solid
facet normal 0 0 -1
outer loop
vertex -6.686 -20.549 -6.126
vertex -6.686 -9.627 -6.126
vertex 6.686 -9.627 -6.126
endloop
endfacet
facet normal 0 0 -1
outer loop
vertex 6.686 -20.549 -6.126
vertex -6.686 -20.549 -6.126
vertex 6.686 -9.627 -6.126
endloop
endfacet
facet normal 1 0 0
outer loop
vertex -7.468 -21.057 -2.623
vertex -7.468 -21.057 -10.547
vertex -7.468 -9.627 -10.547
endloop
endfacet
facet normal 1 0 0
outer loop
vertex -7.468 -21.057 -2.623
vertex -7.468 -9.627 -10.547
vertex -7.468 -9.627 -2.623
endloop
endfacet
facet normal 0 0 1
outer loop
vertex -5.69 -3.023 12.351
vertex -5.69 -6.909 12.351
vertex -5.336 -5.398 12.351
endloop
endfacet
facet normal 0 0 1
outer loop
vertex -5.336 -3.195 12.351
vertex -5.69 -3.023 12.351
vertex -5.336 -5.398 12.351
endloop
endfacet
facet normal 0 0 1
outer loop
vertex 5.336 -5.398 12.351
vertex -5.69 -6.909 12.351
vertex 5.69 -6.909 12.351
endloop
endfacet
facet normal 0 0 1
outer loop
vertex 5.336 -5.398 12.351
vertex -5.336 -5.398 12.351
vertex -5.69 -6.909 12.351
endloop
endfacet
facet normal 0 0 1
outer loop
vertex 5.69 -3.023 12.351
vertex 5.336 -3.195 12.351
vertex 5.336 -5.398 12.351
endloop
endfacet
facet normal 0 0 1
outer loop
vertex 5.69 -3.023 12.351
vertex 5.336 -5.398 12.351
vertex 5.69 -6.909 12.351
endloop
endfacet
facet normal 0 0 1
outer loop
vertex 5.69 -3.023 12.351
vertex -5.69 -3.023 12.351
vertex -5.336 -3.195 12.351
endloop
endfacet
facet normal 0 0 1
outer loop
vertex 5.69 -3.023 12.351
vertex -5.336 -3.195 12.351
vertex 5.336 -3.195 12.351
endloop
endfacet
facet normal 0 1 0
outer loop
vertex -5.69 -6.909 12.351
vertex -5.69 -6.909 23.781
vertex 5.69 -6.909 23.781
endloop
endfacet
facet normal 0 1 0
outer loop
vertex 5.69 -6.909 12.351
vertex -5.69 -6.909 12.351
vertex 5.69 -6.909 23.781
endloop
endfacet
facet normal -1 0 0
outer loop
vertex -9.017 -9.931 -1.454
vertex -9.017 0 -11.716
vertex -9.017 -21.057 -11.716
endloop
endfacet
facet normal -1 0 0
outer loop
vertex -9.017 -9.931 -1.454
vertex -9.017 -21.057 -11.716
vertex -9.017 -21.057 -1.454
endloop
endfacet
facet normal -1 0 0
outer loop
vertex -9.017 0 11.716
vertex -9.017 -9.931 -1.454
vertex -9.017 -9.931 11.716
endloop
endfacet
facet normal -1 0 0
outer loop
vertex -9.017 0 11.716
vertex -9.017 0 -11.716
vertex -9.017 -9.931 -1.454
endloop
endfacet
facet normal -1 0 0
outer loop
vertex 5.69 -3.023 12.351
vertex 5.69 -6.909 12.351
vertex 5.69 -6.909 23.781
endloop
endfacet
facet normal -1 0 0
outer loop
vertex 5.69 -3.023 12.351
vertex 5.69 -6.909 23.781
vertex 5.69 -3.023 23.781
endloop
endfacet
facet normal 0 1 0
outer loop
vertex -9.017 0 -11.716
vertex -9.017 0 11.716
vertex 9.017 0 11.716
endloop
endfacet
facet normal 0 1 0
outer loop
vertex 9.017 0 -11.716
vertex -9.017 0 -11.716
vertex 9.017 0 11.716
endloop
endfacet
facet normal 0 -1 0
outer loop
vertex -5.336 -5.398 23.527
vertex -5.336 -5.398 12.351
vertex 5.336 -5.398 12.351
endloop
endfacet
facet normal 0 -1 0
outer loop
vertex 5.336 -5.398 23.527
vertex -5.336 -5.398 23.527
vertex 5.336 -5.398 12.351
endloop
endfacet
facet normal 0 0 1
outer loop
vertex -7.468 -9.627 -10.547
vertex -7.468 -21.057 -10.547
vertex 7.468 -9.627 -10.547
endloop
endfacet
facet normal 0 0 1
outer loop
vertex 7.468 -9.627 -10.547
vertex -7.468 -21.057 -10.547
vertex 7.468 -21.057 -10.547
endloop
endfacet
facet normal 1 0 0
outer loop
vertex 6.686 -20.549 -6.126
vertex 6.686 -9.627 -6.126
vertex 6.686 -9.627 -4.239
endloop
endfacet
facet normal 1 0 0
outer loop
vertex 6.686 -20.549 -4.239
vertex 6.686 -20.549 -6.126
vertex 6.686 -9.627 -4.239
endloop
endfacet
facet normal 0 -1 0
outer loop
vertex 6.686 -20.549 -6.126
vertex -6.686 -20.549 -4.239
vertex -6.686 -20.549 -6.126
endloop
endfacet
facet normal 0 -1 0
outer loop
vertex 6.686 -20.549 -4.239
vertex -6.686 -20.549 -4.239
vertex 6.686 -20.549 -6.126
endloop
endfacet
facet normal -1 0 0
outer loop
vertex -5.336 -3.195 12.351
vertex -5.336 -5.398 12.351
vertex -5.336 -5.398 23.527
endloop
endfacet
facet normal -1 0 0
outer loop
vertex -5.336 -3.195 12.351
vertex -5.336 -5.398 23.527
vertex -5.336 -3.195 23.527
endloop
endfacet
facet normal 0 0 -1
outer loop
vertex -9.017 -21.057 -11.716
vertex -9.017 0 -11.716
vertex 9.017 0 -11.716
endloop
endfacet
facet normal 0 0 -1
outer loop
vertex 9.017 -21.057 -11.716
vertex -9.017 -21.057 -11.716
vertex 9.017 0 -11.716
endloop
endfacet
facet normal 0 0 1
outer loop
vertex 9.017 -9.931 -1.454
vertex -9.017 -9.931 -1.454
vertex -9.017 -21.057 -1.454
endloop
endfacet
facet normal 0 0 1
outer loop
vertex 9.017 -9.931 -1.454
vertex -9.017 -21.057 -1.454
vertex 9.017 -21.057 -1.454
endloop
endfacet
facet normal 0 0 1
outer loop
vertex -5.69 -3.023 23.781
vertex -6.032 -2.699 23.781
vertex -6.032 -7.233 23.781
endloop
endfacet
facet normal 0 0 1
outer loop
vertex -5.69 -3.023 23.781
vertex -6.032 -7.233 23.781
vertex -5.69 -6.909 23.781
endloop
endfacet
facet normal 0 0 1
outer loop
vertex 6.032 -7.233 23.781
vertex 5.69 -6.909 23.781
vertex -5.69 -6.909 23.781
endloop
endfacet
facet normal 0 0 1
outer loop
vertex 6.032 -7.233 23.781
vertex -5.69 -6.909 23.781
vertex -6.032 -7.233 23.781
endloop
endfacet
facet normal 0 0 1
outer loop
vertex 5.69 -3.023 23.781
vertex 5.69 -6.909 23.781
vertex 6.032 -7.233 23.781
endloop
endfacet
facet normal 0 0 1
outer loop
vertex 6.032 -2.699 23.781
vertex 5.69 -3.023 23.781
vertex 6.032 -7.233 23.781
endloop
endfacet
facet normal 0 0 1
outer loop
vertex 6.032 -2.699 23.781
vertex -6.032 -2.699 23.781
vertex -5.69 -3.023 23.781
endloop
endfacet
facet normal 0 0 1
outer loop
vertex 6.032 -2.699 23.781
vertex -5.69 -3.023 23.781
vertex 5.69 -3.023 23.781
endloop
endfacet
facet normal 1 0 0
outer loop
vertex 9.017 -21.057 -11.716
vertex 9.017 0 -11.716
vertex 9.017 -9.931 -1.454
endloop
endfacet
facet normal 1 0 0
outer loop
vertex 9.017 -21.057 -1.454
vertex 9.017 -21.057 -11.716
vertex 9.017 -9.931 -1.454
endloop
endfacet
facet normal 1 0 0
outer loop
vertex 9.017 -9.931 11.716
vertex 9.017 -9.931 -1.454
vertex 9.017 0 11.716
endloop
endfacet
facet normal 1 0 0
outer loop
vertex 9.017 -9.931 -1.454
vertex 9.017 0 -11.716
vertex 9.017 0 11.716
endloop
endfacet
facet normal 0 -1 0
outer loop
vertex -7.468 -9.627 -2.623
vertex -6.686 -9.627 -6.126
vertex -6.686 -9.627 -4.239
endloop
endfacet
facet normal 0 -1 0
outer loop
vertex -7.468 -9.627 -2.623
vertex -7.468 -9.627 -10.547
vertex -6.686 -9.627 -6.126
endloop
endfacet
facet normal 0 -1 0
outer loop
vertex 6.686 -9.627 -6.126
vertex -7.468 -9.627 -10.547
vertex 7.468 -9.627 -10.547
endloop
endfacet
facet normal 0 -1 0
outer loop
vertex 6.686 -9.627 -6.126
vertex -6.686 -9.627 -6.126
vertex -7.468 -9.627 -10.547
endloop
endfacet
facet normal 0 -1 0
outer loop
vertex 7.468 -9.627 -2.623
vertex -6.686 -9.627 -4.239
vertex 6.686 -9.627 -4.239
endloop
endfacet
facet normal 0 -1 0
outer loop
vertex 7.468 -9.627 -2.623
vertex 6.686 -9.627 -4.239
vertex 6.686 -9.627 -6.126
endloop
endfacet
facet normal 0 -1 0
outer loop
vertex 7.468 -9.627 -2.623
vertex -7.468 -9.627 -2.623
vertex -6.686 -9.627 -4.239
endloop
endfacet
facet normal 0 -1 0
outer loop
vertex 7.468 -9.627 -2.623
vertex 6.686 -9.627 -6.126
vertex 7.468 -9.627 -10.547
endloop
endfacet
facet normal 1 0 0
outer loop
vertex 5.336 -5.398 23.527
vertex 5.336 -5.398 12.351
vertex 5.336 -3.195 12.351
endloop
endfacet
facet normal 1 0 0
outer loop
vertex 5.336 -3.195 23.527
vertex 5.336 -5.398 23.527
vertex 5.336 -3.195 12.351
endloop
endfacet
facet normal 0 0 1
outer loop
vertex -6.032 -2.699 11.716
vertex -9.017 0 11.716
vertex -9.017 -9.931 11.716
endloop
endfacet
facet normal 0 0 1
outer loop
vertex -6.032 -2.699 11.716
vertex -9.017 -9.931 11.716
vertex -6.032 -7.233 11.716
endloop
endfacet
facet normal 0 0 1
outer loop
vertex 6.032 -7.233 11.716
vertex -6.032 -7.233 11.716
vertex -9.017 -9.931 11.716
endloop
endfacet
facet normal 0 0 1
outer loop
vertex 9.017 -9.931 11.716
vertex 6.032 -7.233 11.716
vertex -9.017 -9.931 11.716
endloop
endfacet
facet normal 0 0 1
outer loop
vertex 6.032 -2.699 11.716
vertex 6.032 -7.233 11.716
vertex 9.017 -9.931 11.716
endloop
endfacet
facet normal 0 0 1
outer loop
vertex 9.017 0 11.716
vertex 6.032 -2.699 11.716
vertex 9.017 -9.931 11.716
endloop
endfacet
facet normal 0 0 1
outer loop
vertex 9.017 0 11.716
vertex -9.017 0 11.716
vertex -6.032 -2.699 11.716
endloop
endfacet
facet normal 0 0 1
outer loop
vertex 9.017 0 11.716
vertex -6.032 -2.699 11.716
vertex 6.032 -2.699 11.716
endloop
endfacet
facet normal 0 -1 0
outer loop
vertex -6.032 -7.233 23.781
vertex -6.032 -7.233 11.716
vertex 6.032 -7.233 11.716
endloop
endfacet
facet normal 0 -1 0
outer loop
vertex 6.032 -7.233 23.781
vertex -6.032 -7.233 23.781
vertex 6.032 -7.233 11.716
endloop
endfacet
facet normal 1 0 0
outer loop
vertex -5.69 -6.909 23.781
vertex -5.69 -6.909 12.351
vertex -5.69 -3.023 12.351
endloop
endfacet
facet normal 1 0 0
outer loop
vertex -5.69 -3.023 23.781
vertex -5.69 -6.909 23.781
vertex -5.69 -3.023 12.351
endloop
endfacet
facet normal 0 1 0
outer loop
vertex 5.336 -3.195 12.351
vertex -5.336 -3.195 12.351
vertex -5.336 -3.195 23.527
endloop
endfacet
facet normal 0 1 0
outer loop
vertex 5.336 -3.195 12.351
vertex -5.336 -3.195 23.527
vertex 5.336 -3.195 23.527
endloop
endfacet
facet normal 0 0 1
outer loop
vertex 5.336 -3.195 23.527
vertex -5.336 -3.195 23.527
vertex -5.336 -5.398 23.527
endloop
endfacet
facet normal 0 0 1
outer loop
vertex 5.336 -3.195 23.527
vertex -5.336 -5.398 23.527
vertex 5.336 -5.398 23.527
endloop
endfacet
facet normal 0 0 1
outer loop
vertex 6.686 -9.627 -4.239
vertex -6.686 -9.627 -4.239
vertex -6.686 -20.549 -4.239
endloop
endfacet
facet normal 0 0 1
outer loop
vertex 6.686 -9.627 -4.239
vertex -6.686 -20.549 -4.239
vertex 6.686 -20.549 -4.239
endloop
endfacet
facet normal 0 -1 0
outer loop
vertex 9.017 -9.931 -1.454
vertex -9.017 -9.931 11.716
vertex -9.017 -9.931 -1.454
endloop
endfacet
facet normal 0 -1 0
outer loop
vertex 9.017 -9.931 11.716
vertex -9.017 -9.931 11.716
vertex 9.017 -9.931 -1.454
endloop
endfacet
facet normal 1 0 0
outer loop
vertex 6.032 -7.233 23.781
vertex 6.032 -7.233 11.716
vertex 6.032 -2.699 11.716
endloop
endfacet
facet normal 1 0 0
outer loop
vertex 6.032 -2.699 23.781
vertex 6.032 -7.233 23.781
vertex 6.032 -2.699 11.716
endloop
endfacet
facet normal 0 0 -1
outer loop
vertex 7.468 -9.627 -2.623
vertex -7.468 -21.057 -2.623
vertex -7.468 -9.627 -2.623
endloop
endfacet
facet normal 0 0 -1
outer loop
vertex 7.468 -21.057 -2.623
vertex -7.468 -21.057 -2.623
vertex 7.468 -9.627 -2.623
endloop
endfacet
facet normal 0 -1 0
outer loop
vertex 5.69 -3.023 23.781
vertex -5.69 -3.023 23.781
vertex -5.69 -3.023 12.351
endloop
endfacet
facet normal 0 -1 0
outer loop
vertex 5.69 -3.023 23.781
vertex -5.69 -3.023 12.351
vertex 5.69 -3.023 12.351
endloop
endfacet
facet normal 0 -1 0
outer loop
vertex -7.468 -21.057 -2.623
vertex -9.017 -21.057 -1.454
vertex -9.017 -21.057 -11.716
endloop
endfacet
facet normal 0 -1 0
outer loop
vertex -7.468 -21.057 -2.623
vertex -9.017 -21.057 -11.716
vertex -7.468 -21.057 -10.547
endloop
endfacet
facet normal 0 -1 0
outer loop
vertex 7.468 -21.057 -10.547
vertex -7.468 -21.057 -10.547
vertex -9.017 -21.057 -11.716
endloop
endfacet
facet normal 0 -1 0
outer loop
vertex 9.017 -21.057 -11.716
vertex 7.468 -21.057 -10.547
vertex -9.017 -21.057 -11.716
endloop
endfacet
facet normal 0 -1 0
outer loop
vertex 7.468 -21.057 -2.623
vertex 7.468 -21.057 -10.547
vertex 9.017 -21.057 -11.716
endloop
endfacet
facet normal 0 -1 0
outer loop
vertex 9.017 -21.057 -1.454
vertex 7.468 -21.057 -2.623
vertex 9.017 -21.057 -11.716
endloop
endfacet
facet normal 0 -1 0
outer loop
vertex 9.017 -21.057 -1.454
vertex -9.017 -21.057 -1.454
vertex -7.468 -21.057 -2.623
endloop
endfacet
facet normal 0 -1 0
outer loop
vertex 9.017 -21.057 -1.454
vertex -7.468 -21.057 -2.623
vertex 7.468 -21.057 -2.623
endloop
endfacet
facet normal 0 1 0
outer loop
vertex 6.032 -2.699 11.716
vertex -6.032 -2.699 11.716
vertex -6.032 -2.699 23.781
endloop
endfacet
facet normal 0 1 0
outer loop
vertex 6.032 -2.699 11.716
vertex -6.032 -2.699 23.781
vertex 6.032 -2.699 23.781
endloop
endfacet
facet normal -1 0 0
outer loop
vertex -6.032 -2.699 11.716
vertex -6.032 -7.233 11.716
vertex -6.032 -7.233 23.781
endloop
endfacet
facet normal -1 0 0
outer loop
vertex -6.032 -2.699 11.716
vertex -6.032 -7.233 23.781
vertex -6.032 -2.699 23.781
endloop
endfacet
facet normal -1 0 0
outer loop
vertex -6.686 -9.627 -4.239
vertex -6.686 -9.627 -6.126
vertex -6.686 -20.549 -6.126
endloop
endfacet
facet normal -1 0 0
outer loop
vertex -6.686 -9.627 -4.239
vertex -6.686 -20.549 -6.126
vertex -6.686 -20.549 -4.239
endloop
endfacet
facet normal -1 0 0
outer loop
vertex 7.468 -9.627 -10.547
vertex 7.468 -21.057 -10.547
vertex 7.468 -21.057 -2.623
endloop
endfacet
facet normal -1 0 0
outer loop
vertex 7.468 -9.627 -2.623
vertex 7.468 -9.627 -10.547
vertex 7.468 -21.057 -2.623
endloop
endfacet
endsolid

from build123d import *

# Parameters (mm, degrees)
F0_W      = 18.034
F0_H      = 23.4315
F1_DEPTH  = 21.0566
F2_W      = 18.034
F2_H      = 11.1252
F3_DEPTH  = 13.1699
F4_W      = 12.065
F4_H      = 4.5339
F5_DEPTH  = 12.065
F6_W      = 14.9352
F6_H      = 7.9248
F7_DEPTH  = 11.43
F8_W      = 11.3792
F8_H      = 3.8862
F9_DEPTH  = 11.43
F10_W     = 10.67195
F10_H     = 2.202249
F11_DEPTH = 11.176
F12_W     = 13.372126
F12_H     = 1.887192
F13_DEPTH = 10.922


with BuildPart() as f1:
    # F0 (on Front) → F1 (new body)
    with BuildSketch(Plane.XZ):
        Rectangle(F0_W, F0_H)
    extrude(amount=F1_DEPTH)

    # F2 (on face) → F3 (cut)
    with BuildSketch(Plane.XY.offset(11.71575)):
        with Locations((0, -15.494)):
            Rectangle(F2_W, F2_H)
    extrude(amount=-F3_DEPTH, mode=Mode.SUBTRACT)

    # F4 (on face) → F5 (join)
    with BuildSketch(Plane.XY.offset(11.71575)):
        with Locations((0, -4.9657)):
            Rectangle(F4_W, F4_H)
    extrude(amount=F5_DEPTH)

    # F6 (on face) → F7 (cut)
    with BuildSketch(Plane.XZ.offset(21.0566)):
        with Locations((0, -6.58495)):
            Rectangle(F6_W, F6_H)
    extrude(amount=-F7_DEPTH, mode=Mode.SUBTRACT)

    # F8 (on face) → F9 (cut)
    with BuildSketch(Plane.XY.offset(23.78075)):
        with Locations((0, -4.9657)):
            Rectangle(F8_W, F8_H)
    extrude(amount=-F9_DEPTH, mode=Mode.SUBTRACT)

    # F10 (on face) → F11 (join)
    with BuildSketch(Plane.XY.offset(12.35075)):
        with Locations((0, -4.296474)):
            Rectangle(F10_W, F10_H)
    extrude(amount=F11_DEPTH)

    # F12 (on face) → F13 (join)
    with BuildSketch(Plane.XZ.offset(9.6266)):
        with Locations((0, -5.182573)):
            Rectangle(F12_W, F12_H)
    extrude(amount=F13_DEPTH)


solid = f1.part
